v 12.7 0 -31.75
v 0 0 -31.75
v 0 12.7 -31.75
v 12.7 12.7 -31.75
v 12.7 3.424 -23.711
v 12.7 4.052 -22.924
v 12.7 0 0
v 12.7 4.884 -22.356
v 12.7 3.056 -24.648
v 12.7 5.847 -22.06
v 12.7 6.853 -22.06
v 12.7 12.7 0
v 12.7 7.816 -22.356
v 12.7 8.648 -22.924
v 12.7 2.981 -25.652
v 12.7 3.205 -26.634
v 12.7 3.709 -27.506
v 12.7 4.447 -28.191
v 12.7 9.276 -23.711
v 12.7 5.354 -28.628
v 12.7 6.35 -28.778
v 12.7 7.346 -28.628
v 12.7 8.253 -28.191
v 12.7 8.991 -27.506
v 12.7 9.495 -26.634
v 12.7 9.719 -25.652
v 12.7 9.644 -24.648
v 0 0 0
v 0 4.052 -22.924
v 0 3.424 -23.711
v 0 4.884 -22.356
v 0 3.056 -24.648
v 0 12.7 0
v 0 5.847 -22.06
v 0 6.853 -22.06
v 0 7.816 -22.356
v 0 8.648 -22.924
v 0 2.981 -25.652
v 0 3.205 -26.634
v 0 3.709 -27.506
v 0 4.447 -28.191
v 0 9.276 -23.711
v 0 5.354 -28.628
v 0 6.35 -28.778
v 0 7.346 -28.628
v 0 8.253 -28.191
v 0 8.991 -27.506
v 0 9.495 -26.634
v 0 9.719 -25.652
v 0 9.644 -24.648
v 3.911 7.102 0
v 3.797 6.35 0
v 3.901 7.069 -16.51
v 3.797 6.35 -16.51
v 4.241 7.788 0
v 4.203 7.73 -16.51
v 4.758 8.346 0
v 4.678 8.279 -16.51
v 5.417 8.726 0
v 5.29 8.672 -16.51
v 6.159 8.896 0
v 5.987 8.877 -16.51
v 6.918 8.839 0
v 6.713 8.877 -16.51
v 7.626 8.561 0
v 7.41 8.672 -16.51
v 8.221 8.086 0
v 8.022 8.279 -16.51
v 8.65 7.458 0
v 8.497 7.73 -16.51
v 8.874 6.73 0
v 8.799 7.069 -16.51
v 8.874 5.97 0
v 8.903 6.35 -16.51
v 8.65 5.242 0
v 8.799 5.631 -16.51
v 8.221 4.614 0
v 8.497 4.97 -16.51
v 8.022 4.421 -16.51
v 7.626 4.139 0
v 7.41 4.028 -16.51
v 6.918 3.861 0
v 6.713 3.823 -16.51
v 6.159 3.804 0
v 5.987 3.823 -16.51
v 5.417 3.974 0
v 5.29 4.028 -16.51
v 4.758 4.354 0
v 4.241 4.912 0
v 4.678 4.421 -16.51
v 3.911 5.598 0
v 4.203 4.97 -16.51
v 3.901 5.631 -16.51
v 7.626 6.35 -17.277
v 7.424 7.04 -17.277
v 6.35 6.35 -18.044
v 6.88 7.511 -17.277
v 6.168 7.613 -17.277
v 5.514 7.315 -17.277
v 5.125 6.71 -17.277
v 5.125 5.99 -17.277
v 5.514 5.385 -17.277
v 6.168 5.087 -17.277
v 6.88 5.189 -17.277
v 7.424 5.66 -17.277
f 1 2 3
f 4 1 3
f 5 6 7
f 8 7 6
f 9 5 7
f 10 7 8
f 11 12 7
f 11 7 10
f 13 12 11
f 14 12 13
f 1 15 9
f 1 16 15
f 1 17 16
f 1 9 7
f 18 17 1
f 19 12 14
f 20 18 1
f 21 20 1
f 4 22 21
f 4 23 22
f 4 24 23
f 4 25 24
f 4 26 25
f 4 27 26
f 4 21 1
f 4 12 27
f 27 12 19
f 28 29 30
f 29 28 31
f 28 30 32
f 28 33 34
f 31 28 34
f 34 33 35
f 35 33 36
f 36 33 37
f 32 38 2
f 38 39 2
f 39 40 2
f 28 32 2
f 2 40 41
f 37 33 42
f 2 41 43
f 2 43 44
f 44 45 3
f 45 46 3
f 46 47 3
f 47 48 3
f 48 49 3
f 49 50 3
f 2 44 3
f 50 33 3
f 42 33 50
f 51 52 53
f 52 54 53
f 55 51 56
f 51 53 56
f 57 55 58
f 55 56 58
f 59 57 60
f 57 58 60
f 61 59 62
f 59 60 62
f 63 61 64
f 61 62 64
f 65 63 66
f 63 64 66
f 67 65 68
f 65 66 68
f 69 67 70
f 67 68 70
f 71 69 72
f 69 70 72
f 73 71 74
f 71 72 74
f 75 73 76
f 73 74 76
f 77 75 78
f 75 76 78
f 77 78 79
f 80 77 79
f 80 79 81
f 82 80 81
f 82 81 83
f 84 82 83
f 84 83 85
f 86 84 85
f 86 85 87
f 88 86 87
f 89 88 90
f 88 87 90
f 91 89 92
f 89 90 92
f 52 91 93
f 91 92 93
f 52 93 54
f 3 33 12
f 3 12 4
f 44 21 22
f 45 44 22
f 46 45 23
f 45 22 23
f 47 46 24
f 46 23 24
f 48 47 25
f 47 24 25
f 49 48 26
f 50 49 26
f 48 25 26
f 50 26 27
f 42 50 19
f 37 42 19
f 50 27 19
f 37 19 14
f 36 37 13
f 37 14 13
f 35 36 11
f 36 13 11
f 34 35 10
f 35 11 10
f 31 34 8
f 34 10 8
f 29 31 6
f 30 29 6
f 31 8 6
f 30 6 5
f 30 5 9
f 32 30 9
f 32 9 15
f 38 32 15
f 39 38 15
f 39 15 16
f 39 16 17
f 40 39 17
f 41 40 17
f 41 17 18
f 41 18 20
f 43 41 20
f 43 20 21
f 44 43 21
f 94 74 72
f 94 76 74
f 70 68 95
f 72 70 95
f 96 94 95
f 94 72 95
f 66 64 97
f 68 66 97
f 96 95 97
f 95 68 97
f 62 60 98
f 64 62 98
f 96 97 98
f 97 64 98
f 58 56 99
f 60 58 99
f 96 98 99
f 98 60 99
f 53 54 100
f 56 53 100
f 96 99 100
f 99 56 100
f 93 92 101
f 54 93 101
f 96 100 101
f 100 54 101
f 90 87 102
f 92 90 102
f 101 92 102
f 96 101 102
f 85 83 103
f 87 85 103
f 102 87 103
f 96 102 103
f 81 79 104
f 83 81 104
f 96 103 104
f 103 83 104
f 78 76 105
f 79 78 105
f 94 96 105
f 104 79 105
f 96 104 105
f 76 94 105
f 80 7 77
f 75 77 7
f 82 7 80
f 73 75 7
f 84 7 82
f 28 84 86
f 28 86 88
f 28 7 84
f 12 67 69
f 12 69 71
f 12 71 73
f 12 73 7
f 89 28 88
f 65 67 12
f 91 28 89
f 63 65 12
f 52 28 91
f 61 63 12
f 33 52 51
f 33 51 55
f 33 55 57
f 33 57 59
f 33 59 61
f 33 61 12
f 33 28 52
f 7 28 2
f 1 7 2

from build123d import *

# Parameters (mm, degrees)
SKETCH1_W                   = 31.75
SKETCH1_H                   = 12.7
BOSS_EXTRUDE1_DEPTH         = 12.7
F_1_4_20_TAPPED_HOLE1_D     = 5.1054
F_1_4_20_TAPPED_HOLE1_DEPTH = 16.51
F_1_4_20_TAPPED_HOLE1_TIP   = 1.533816902
SKETCH4_R                   = 3.3782
CUT_EXTRUDE1_DEPTH          = 13.7


with BuildPart() as part:
    # Sketch1 → Boss-Extrude1 (new body)
    with BuildSketch(Plane(origin=(0, 0, 0), x_dir=(0, 0, -1), z_dir=(1, 0, 0))):
        with Locations((15.875, 6.35)):
            Rectangle(SKETCH1_W, SKETCH1_H)
    extrude(amount=BOSS_EXTRUDE1_DEPTH)

    # 1/4-20 Tapped Hole1
    with Locations(Plane.XY):
        with Locations((6.35, 6.35)):
            Hole(F_1_4_20_TAPPED_HOLE1_D / 2, depth=F_1_4_20_TAPPED_HOLE1_DEPTH)
            with Locations((0, 0, -(F_1_4_20_TAPPED_HOLE1_DEPTH + F_1_4_20_TAPPED_HOLE1_TIP / 2))):  # 118° drill point
                Cone(0, F_1_4_20_TAPPED_HOLE1_D / 2, F_1_4_20_TAPPED_HOLE1_TIP, mode=Mode.SUBTRACT)

    # Sketch4 → Cut-Extrude1 (cut, through all)
    with BuildSketch(Plane(origin=(12.7, 0, 0), x_dir=(0, 0, -1), z_dir=(1, 0, 0))):
        with Locations((25.4, 6.35)):
            Circle(SKETCH4_R)
    extrude(amount=-CUT_EXTRUDE1_DEPTH, mode=Mode.SUBTRACT)


solid = part.part
